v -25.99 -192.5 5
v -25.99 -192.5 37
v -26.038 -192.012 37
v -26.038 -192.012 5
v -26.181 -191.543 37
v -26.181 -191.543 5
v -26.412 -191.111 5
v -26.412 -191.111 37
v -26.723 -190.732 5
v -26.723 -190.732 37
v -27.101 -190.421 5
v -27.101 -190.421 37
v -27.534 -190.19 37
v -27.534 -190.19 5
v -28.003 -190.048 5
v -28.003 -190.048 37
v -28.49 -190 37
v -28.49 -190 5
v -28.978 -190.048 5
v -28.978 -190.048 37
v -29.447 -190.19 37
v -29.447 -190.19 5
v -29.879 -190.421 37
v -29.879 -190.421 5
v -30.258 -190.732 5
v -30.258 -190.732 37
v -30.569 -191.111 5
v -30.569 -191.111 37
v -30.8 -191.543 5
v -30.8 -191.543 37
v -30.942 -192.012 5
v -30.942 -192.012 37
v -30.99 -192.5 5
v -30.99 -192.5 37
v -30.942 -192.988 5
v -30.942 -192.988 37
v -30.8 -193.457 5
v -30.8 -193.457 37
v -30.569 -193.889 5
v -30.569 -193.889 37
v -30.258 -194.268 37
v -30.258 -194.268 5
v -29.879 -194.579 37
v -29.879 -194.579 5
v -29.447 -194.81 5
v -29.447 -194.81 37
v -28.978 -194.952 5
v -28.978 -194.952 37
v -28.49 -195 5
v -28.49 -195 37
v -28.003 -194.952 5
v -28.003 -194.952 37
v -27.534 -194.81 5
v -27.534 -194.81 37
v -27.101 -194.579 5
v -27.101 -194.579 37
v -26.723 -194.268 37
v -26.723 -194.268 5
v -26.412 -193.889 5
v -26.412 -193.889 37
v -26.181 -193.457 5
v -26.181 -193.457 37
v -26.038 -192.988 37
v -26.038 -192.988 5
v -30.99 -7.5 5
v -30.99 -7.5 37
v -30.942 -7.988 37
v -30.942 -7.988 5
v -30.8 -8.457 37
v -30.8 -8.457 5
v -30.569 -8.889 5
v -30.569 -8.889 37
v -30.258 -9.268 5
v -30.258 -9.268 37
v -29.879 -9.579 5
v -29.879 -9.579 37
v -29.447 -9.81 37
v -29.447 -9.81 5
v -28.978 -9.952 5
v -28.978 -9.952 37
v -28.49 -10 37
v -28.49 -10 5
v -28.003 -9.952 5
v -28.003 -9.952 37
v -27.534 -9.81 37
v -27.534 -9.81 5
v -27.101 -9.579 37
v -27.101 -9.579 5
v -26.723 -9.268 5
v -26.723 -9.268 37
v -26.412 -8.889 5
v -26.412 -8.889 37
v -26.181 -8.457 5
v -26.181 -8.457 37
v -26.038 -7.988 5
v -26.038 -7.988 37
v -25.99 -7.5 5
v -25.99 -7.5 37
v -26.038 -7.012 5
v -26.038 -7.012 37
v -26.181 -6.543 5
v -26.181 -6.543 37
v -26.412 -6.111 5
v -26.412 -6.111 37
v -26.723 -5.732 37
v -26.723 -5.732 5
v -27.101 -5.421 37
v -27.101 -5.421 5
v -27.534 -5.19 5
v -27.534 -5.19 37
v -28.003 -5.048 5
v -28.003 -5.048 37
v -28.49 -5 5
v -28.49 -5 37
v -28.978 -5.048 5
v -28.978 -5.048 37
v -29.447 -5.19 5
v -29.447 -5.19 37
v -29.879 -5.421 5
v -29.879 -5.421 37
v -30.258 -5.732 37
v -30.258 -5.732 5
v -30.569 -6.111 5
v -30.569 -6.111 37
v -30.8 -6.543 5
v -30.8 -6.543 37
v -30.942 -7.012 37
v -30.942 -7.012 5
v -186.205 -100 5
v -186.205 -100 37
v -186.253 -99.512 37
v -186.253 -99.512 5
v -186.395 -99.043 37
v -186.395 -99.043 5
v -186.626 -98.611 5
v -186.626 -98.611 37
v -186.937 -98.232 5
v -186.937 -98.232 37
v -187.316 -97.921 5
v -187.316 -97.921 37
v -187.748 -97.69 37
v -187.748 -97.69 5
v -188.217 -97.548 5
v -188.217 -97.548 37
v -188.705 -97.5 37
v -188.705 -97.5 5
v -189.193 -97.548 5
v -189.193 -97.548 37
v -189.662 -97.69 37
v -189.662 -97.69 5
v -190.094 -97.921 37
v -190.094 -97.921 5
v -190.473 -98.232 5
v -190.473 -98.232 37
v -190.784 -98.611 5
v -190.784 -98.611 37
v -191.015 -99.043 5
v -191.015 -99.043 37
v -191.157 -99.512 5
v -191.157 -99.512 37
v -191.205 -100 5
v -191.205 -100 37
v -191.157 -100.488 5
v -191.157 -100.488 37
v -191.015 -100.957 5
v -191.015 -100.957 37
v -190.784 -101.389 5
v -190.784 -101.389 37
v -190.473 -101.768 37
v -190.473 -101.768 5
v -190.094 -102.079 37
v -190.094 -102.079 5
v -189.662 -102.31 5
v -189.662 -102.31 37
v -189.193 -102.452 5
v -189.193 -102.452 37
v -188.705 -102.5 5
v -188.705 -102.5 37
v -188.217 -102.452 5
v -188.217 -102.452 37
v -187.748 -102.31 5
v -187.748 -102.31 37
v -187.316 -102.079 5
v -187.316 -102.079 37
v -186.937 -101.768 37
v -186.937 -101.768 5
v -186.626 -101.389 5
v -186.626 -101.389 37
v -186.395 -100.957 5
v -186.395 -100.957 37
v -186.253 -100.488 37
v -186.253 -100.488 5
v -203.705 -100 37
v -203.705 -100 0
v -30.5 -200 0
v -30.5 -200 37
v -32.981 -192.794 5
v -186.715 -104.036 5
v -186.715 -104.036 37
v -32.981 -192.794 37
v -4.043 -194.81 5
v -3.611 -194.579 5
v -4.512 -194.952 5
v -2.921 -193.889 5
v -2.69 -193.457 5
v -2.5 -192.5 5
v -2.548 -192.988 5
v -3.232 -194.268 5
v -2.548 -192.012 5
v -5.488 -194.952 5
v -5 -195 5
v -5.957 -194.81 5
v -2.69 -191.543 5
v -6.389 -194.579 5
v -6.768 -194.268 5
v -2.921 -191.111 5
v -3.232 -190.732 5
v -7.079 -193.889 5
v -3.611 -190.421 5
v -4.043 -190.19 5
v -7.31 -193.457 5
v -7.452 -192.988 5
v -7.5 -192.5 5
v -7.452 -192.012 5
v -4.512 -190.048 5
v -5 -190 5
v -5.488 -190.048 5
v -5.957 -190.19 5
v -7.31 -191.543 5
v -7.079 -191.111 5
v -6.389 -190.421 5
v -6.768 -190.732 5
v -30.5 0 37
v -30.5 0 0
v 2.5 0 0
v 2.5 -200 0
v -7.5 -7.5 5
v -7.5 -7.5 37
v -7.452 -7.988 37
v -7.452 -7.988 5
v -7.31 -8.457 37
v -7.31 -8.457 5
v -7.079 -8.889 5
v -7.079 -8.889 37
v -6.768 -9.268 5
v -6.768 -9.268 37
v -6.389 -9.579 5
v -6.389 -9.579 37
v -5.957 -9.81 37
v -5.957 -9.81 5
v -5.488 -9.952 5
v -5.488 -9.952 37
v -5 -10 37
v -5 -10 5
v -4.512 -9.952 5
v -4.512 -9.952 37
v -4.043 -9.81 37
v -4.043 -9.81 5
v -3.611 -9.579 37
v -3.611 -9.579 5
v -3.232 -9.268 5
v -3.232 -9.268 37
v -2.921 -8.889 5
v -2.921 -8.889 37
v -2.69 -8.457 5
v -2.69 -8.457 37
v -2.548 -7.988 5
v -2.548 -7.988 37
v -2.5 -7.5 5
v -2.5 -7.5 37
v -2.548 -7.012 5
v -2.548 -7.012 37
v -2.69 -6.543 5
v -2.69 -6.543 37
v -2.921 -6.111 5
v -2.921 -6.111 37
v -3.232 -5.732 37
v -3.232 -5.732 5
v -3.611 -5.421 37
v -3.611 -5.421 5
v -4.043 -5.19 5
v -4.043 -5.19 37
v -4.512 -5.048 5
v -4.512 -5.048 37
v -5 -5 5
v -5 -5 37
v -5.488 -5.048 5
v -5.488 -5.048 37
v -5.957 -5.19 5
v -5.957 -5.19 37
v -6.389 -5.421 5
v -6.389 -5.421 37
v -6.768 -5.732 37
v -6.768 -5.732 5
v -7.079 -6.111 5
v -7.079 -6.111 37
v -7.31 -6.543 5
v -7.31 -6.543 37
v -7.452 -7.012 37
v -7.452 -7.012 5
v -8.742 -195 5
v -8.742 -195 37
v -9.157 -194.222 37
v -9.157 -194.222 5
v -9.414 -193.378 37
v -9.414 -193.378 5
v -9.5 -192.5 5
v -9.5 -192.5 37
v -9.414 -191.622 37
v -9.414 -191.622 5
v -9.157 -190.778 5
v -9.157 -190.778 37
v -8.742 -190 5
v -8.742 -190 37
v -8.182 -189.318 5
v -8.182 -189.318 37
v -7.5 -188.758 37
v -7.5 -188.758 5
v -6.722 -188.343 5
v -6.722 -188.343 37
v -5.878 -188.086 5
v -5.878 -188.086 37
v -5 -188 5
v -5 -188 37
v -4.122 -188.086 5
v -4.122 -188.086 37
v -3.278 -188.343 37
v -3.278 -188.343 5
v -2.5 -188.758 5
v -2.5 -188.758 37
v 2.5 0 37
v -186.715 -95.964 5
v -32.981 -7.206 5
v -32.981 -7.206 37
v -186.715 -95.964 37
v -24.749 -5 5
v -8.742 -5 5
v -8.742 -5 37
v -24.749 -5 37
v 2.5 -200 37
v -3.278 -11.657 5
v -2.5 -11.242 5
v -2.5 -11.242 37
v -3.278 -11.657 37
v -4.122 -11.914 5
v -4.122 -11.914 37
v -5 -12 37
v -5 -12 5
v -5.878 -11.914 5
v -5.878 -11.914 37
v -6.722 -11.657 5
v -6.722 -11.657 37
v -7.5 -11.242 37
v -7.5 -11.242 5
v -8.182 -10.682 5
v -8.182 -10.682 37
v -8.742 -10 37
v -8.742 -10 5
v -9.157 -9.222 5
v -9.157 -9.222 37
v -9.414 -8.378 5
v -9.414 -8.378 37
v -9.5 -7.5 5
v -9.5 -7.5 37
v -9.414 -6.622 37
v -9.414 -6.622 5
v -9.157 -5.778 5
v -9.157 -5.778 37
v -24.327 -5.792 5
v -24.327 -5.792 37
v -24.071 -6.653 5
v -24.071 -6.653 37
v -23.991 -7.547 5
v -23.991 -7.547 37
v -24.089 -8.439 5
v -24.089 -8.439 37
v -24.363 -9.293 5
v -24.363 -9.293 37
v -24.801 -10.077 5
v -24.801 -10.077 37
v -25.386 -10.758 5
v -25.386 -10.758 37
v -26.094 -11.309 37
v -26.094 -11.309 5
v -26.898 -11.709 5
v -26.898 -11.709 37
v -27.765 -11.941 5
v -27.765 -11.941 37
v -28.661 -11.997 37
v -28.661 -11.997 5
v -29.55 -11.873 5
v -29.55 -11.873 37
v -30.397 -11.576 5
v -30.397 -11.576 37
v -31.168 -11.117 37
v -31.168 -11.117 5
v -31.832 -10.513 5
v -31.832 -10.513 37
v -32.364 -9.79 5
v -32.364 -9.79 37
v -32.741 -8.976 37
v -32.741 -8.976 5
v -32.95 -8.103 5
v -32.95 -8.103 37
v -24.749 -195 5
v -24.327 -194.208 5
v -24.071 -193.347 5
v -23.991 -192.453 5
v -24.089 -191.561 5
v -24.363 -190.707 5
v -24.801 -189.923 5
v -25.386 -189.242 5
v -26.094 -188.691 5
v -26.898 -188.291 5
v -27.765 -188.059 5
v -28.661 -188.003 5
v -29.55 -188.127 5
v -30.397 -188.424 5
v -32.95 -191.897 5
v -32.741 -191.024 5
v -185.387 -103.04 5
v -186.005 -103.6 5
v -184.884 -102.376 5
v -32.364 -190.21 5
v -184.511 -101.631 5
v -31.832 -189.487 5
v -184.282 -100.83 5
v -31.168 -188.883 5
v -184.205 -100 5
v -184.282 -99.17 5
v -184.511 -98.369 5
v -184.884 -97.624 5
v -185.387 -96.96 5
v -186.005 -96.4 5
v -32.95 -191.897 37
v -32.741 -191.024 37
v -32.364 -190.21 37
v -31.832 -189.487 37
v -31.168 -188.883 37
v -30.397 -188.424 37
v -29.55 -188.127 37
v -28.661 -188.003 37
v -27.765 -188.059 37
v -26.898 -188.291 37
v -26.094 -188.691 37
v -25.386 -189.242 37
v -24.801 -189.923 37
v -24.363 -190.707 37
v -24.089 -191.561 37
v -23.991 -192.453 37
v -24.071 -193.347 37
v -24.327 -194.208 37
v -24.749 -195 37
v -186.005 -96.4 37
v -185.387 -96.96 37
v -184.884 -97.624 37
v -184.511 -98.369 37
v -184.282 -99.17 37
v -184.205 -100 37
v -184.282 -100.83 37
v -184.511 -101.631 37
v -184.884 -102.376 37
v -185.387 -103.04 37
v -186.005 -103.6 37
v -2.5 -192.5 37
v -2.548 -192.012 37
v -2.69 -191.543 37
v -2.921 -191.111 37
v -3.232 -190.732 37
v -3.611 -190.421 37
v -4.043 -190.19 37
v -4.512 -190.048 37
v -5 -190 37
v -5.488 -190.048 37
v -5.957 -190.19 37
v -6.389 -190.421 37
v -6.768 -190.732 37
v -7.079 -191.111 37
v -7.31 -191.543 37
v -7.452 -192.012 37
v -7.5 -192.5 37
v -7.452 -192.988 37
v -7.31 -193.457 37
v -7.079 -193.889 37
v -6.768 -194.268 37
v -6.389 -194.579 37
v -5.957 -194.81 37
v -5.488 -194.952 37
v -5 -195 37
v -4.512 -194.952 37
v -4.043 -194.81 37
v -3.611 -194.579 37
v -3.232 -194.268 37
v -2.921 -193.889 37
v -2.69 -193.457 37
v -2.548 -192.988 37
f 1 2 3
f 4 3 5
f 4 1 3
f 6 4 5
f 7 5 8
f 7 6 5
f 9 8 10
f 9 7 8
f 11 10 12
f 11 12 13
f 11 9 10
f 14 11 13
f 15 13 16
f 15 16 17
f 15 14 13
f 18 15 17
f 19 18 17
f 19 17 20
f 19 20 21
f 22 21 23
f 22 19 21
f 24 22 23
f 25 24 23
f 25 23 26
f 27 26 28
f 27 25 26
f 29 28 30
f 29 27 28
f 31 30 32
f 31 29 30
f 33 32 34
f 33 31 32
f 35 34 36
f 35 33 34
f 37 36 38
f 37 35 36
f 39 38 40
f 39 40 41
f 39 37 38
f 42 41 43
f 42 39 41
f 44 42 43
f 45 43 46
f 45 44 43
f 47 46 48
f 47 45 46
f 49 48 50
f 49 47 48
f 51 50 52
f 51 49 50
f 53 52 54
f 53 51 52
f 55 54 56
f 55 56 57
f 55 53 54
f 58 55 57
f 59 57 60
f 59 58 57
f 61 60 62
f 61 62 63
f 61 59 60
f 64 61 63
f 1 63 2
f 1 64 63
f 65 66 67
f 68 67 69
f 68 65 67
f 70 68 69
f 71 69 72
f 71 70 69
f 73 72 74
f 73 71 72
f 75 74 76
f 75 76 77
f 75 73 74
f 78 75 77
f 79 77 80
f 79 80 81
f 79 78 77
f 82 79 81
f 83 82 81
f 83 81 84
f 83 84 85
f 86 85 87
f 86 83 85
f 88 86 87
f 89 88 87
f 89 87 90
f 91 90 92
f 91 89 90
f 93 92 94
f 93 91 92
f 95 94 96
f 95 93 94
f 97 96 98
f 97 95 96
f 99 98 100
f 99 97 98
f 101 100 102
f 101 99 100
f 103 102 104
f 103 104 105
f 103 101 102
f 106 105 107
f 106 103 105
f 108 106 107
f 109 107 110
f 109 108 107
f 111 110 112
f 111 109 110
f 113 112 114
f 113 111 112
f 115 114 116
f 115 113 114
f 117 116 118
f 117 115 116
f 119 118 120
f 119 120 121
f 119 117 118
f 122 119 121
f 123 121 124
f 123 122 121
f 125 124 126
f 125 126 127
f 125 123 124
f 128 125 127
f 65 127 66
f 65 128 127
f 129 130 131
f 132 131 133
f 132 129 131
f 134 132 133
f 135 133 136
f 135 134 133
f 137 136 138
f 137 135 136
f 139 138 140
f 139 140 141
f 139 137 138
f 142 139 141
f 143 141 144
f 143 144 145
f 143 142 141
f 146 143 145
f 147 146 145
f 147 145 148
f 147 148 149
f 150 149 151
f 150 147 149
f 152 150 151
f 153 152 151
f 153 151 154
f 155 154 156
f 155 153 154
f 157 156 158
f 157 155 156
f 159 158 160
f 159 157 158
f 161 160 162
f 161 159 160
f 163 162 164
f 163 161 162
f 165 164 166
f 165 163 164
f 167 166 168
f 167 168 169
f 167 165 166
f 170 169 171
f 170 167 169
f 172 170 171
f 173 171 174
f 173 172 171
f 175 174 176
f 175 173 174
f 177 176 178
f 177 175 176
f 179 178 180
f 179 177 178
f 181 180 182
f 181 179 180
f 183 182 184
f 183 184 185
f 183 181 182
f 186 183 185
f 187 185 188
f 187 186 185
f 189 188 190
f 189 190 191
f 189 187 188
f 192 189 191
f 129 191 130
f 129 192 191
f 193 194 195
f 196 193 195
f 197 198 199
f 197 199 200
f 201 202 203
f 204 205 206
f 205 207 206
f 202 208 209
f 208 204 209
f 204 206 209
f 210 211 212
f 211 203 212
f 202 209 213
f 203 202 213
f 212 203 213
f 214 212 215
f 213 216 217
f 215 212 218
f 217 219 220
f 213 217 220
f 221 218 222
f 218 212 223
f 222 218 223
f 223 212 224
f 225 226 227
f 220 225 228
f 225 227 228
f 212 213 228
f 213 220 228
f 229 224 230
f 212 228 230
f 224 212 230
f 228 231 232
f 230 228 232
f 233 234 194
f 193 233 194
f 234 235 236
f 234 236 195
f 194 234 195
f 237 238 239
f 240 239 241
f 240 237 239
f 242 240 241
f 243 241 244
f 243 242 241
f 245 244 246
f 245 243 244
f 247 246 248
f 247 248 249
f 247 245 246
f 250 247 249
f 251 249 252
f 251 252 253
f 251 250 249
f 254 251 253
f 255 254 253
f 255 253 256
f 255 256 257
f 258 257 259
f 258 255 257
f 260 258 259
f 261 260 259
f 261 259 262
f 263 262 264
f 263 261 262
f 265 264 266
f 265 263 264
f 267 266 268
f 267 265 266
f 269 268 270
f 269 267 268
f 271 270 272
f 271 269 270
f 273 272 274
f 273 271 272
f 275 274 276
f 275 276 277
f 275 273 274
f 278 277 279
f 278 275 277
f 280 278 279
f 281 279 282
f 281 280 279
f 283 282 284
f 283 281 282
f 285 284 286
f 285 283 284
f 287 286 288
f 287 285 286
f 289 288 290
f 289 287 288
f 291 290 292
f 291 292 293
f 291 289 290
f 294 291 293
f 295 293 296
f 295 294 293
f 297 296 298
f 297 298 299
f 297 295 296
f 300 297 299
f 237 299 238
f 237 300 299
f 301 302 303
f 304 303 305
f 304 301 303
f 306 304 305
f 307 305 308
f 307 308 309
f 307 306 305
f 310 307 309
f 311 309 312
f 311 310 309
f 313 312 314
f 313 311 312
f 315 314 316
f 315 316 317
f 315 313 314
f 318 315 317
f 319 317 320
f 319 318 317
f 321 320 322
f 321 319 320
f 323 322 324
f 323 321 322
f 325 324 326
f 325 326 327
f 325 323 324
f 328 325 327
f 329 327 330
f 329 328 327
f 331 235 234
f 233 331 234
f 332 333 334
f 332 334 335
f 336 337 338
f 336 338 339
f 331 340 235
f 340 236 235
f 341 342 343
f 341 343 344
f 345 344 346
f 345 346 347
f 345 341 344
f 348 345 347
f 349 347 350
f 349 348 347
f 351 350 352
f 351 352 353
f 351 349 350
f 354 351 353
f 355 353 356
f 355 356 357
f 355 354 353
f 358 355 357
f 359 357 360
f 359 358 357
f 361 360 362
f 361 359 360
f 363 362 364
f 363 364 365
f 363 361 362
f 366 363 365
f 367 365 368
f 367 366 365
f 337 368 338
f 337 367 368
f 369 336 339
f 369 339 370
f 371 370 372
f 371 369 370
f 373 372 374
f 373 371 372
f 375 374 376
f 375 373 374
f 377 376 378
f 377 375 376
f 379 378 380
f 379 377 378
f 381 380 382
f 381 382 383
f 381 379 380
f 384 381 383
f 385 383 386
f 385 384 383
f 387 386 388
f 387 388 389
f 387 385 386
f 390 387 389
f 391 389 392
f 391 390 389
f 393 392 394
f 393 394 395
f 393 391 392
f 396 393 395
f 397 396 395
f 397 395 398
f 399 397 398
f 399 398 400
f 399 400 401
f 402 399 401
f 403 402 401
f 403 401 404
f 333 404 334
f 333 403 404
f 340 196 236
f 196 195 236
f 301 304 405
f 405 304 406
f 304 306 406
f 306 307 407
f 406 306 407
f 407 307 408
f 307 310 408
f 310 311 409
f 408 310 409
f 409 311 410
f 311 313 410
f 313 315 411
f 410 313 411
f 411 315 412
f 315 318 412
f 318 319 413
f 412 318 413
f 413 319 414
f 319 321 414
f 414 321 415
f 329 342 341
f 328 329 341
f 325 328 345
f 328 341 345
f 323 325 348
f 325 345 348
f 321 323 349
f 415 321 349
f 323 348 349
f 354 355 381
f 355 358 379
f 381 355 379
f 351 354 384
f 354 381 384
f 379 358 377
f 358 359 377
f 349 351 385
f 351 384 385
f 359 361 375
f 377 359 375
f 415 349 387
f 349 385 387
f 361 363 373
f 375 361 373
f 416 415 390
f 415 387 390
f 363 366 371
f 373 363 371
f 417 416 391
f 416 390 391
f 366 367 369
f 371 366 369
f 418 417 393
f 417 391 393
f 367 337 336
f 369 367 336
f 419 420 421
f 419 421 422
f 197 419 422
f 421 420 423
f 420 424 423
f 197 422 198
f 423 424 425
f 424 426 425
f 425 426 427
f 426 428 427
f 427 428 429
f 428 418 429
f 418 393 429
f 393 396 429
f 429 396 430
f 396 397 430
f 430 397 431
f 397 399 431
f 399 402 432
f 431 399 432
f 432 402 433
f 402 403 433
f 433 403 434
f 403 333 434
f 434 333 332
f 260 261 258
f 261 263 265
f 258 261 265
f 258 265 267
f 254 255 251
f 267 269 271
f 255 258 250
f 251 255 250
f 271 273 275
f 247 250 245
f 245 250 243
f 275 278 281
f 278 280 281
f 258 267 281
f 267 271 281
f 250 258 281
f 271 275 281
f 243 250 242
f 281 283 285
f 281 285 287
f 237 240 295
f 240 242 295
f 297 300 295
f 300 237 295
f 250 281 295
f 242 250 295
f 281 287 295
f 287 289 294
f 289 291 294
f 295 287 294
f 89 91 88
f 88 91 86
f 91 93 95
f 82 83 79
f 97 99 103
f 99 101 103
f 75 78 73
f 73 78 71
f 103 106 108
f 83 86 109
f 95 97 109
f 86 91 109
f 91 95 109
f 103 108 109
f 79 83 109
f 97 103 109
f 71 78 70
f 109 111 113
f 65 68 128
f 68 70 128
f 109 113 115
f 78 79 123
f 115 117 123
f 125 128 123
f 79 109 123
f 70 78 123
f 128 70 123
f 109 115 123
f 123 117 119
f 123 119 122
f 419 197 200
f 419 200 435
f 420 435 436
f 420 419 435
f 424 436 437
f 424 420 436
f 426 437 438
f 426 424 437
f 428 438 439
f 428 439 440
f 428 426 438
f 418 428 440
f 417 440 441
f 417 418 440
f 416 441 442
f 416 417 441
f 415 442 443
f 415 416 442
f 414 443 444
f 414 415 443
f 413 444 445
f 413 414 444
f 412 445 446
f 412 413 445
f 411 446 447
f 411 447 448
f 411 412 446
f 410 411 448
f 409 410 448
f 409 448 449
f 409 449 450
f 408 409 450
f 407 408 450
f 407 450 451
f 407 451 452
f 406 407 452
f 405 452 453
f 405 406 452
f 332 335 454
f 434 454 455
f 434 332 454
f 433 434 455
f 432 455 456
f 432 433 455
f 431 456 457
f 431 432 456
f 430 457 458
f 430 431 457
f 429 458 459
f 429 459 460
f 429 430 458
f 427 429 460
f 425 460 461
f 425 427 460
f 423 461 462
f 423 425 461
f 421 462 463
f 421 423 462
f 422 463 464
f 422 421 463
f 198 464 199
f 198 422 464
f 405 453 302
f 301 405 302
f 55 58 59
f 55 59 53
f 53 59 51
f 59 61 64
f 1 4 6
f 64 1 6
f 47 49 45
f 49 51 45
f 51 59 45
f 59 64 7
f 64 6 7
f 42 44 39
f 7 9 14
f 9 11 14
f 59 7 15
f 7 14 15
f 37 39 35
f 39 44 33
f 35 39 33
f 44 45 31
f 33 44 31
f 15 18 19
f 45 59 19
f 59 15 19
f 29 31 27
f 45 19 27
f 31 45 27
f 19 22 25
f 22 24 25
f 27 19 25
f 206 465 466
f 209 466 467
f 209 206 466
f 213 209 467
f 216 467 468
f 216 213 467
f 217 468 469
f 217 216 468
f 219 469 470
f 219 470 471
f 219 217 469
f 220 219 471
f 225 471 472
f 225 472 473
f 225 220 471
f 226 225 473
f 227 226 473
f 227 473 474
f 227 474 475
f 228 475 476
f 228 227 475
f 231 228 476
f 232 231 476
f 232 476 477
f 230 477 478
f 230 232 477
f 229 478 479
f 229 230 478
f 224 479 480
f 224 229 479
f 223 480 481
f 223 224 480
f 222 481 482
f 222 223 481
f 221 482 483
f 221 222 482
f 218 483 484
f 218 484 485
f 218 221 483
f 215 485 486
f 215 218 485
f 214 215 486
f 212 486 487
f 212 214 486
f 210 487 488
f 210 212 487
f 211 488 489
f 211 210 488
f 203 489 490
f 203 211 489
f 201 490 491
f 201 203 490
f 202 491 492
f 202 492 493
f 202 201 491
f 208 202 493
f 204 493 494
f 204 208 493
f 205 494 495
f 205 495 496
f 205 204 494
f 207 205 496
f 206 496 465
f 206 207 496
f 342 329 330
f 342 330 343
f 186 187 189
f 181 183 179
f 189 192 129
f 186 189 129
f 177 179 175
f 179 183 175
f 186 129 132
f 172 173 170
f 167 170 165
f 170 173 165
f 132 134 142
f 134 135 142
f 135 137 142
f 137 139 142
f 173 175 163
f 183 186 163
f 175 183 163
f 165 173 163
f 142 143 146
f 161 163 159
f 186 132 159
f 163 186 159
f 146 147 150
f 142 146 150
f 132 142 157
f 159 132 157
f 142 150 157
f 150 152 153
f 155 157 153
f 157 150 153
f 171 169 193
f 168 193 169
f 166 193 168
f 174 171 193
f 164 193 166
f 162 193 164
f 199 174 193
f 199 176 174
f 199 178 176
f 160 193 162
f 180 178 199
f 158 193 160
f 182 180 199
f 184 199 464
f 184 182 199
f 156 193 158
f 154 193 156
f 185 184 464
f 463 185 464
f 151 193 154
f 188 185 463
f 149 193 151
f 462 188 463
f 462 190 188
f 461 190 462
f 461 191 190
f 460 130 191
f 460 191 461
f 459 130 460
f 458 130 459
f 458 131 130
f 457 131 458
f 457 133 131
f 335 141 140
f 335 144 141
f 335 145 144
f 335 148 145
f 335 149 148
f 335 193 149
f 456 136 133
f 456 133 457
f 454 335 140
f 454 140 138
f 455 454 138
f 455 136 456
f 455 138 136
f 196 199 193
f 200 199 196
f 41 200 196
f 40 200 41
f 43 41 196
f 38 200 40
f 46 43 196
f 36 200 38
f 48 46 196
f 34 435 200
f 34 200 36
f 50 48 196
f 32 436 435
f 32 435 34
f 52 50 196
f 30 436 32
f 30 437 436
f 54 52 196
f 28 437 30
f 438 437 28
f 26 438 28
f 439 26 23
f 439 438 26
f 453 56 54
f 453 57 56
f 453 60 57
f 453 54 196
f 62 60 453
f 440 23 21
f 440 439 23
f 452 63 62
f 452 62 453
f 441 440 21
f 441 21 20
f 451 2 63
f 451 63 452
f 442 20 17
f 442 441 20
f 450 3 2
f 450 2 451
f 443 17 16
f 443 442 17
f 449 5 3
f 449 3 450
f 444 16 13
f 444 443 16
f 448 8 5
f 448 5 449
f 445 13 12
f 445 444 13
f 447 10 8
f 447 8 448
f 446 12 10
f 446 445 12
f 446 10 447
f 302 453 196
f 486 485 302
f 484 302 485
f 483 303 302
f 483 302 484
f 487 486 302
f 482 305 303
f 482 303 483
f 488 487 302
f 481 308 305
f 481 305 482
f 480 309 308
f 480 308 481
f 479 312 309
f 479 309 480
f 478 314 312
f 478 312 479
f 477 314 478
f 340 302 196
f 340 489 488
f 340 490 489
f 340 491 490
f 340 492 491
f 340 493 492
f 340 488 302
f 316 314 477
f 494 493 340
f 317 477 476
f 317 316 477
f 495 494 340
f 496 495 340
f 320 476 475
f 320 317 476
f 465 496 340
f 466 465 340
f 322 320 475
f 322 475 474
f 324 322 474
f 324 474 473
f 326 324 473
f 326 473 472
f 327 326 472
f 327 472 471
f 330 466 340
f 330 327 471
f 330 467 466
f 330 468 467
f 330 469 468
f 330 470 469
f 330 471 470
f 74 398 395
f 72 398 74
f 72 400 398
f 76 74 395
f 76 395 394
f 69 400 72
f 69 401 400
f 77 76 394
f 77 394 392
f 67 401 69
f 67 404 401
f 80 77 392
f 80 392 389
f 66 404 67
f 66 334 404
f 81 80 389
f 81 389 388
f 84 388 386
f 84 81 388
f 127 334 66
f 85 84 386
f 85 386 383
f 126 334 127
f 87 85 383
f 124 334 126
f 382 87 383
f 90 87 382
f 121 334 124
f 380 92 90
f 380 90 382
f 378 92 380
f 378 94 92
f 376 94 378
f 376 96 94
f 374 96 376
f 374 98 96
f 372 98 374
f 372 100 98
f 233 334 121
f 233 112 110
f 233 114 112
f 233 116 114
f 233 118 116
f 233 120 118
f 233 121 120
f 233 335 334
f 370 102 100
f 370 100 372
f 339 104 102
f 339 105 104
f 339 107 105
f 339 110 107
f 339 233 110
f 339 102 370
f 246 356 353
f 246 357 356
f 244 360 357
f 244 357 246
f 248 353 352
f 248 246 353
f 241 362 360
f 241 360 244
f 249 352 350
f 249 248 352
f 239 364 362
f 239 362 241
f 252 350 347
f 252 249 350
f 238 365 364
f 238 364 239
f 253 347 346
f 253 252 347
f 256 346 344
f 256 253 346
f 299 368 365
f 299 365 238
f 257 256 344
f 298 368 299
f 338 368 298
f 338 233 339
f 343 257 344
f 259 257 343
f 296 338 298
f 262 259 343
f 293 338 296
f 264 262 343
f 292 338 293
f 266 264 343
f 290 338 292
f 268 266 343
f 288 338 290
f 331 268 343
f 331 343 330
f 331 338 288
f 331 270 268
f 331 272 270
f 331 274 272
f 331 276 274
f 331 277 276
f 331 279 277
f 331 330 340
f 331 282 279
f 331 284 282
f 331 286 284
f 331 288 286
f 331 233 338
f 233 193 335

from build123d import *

# Parameters (mm, degrees)
BOSS_EXTRUDE1_DEPTH = 5
SKETCH2_R           = 2.5
BOSS_EXTRUDE2_DEPTH = 32


with BuildPart() as part:
    # Sketch1 → Boss-Extrude1 (new body)
    with BuildSketch(Plane.XY):
        Polygon((-30.5, -200), (-203.705080757, -100), (-30.5, 0), (2.5, 0), (2.5, -200), align=None)
    extrude(amount=BOSS_EXTRUDE1_DEPTH)

    # Sketch2 → Boss-Extrude2 (add)
    with BuildSketch(Plane.XY.offset(5)):
        Polygon((-203.705080757, -100), (-30.5, -200), (2.5, -200), (2.5, 0), (-30.5, 0), align=None)
        with Locations((-188.705080757, -100)):
            Circle(SKETCH2_R, mode=Mode.SUBTRACT)
        with Locations((-5, -192.5)):
            Circle(SKETCH2_R, mode=Mode.SUBTRACT)
        with Locations(Location((-5, -7.5, 0), (0, 0, 180))):
            Circle(SKETCH2_R, mode=Mode.SUBTRACT)
        with Locations((-28.490381057, -192.5)):
            Circle(SKETCH2_R, mode=Mode.SUBTRACT)
        with Locations(Location((-28.490381057, -7.5, 0), (0, 0, 180))):
            Circle(SKETCH2_R, mode=Mode.SUBTRACT)
        with BuildLine():
            Line((-8.741657387, -5), (-24.74872367, -5))
            ThreePointArc((-24.74872367, -5), (-27.325695354, -11.846666218), (-32.980751406, -7.205765184))
            Line((-32.980751406, -7.205765184), (-186.714710408, -95.964107797))
            ThreePointArc((-186.714710408, -95.964107797), (-184.205080757, -100), (-186.714710408, -104.035892203))
            Line((-186.714710408, -104.035892203), (-32.980751406, -192.794234816))
            ThreePointArc((-32.980751406, -192.794234816), (-27.325695354, -188.153333782), (-24.74872367, -195))
            Line((-24.74872367, -195), (-8.741657387, -195))
            ThreePointArc((-8.741657387, -195), (-8.181980515, -189.318019485), (-2.5, -188.758342613))
            Line((-2.5, -188.758342613), (-2.5, -11.241657387))
            ThreePointArc((-2.5, -11.241657387), (-8.181980515, -10.681980515), (-8.741657387, -5))
        make_face(mode=Mode.SUBTRACT)
    extrude(amount=BOSS_EXTRUDE2_DEPTH)


solid = part.part
